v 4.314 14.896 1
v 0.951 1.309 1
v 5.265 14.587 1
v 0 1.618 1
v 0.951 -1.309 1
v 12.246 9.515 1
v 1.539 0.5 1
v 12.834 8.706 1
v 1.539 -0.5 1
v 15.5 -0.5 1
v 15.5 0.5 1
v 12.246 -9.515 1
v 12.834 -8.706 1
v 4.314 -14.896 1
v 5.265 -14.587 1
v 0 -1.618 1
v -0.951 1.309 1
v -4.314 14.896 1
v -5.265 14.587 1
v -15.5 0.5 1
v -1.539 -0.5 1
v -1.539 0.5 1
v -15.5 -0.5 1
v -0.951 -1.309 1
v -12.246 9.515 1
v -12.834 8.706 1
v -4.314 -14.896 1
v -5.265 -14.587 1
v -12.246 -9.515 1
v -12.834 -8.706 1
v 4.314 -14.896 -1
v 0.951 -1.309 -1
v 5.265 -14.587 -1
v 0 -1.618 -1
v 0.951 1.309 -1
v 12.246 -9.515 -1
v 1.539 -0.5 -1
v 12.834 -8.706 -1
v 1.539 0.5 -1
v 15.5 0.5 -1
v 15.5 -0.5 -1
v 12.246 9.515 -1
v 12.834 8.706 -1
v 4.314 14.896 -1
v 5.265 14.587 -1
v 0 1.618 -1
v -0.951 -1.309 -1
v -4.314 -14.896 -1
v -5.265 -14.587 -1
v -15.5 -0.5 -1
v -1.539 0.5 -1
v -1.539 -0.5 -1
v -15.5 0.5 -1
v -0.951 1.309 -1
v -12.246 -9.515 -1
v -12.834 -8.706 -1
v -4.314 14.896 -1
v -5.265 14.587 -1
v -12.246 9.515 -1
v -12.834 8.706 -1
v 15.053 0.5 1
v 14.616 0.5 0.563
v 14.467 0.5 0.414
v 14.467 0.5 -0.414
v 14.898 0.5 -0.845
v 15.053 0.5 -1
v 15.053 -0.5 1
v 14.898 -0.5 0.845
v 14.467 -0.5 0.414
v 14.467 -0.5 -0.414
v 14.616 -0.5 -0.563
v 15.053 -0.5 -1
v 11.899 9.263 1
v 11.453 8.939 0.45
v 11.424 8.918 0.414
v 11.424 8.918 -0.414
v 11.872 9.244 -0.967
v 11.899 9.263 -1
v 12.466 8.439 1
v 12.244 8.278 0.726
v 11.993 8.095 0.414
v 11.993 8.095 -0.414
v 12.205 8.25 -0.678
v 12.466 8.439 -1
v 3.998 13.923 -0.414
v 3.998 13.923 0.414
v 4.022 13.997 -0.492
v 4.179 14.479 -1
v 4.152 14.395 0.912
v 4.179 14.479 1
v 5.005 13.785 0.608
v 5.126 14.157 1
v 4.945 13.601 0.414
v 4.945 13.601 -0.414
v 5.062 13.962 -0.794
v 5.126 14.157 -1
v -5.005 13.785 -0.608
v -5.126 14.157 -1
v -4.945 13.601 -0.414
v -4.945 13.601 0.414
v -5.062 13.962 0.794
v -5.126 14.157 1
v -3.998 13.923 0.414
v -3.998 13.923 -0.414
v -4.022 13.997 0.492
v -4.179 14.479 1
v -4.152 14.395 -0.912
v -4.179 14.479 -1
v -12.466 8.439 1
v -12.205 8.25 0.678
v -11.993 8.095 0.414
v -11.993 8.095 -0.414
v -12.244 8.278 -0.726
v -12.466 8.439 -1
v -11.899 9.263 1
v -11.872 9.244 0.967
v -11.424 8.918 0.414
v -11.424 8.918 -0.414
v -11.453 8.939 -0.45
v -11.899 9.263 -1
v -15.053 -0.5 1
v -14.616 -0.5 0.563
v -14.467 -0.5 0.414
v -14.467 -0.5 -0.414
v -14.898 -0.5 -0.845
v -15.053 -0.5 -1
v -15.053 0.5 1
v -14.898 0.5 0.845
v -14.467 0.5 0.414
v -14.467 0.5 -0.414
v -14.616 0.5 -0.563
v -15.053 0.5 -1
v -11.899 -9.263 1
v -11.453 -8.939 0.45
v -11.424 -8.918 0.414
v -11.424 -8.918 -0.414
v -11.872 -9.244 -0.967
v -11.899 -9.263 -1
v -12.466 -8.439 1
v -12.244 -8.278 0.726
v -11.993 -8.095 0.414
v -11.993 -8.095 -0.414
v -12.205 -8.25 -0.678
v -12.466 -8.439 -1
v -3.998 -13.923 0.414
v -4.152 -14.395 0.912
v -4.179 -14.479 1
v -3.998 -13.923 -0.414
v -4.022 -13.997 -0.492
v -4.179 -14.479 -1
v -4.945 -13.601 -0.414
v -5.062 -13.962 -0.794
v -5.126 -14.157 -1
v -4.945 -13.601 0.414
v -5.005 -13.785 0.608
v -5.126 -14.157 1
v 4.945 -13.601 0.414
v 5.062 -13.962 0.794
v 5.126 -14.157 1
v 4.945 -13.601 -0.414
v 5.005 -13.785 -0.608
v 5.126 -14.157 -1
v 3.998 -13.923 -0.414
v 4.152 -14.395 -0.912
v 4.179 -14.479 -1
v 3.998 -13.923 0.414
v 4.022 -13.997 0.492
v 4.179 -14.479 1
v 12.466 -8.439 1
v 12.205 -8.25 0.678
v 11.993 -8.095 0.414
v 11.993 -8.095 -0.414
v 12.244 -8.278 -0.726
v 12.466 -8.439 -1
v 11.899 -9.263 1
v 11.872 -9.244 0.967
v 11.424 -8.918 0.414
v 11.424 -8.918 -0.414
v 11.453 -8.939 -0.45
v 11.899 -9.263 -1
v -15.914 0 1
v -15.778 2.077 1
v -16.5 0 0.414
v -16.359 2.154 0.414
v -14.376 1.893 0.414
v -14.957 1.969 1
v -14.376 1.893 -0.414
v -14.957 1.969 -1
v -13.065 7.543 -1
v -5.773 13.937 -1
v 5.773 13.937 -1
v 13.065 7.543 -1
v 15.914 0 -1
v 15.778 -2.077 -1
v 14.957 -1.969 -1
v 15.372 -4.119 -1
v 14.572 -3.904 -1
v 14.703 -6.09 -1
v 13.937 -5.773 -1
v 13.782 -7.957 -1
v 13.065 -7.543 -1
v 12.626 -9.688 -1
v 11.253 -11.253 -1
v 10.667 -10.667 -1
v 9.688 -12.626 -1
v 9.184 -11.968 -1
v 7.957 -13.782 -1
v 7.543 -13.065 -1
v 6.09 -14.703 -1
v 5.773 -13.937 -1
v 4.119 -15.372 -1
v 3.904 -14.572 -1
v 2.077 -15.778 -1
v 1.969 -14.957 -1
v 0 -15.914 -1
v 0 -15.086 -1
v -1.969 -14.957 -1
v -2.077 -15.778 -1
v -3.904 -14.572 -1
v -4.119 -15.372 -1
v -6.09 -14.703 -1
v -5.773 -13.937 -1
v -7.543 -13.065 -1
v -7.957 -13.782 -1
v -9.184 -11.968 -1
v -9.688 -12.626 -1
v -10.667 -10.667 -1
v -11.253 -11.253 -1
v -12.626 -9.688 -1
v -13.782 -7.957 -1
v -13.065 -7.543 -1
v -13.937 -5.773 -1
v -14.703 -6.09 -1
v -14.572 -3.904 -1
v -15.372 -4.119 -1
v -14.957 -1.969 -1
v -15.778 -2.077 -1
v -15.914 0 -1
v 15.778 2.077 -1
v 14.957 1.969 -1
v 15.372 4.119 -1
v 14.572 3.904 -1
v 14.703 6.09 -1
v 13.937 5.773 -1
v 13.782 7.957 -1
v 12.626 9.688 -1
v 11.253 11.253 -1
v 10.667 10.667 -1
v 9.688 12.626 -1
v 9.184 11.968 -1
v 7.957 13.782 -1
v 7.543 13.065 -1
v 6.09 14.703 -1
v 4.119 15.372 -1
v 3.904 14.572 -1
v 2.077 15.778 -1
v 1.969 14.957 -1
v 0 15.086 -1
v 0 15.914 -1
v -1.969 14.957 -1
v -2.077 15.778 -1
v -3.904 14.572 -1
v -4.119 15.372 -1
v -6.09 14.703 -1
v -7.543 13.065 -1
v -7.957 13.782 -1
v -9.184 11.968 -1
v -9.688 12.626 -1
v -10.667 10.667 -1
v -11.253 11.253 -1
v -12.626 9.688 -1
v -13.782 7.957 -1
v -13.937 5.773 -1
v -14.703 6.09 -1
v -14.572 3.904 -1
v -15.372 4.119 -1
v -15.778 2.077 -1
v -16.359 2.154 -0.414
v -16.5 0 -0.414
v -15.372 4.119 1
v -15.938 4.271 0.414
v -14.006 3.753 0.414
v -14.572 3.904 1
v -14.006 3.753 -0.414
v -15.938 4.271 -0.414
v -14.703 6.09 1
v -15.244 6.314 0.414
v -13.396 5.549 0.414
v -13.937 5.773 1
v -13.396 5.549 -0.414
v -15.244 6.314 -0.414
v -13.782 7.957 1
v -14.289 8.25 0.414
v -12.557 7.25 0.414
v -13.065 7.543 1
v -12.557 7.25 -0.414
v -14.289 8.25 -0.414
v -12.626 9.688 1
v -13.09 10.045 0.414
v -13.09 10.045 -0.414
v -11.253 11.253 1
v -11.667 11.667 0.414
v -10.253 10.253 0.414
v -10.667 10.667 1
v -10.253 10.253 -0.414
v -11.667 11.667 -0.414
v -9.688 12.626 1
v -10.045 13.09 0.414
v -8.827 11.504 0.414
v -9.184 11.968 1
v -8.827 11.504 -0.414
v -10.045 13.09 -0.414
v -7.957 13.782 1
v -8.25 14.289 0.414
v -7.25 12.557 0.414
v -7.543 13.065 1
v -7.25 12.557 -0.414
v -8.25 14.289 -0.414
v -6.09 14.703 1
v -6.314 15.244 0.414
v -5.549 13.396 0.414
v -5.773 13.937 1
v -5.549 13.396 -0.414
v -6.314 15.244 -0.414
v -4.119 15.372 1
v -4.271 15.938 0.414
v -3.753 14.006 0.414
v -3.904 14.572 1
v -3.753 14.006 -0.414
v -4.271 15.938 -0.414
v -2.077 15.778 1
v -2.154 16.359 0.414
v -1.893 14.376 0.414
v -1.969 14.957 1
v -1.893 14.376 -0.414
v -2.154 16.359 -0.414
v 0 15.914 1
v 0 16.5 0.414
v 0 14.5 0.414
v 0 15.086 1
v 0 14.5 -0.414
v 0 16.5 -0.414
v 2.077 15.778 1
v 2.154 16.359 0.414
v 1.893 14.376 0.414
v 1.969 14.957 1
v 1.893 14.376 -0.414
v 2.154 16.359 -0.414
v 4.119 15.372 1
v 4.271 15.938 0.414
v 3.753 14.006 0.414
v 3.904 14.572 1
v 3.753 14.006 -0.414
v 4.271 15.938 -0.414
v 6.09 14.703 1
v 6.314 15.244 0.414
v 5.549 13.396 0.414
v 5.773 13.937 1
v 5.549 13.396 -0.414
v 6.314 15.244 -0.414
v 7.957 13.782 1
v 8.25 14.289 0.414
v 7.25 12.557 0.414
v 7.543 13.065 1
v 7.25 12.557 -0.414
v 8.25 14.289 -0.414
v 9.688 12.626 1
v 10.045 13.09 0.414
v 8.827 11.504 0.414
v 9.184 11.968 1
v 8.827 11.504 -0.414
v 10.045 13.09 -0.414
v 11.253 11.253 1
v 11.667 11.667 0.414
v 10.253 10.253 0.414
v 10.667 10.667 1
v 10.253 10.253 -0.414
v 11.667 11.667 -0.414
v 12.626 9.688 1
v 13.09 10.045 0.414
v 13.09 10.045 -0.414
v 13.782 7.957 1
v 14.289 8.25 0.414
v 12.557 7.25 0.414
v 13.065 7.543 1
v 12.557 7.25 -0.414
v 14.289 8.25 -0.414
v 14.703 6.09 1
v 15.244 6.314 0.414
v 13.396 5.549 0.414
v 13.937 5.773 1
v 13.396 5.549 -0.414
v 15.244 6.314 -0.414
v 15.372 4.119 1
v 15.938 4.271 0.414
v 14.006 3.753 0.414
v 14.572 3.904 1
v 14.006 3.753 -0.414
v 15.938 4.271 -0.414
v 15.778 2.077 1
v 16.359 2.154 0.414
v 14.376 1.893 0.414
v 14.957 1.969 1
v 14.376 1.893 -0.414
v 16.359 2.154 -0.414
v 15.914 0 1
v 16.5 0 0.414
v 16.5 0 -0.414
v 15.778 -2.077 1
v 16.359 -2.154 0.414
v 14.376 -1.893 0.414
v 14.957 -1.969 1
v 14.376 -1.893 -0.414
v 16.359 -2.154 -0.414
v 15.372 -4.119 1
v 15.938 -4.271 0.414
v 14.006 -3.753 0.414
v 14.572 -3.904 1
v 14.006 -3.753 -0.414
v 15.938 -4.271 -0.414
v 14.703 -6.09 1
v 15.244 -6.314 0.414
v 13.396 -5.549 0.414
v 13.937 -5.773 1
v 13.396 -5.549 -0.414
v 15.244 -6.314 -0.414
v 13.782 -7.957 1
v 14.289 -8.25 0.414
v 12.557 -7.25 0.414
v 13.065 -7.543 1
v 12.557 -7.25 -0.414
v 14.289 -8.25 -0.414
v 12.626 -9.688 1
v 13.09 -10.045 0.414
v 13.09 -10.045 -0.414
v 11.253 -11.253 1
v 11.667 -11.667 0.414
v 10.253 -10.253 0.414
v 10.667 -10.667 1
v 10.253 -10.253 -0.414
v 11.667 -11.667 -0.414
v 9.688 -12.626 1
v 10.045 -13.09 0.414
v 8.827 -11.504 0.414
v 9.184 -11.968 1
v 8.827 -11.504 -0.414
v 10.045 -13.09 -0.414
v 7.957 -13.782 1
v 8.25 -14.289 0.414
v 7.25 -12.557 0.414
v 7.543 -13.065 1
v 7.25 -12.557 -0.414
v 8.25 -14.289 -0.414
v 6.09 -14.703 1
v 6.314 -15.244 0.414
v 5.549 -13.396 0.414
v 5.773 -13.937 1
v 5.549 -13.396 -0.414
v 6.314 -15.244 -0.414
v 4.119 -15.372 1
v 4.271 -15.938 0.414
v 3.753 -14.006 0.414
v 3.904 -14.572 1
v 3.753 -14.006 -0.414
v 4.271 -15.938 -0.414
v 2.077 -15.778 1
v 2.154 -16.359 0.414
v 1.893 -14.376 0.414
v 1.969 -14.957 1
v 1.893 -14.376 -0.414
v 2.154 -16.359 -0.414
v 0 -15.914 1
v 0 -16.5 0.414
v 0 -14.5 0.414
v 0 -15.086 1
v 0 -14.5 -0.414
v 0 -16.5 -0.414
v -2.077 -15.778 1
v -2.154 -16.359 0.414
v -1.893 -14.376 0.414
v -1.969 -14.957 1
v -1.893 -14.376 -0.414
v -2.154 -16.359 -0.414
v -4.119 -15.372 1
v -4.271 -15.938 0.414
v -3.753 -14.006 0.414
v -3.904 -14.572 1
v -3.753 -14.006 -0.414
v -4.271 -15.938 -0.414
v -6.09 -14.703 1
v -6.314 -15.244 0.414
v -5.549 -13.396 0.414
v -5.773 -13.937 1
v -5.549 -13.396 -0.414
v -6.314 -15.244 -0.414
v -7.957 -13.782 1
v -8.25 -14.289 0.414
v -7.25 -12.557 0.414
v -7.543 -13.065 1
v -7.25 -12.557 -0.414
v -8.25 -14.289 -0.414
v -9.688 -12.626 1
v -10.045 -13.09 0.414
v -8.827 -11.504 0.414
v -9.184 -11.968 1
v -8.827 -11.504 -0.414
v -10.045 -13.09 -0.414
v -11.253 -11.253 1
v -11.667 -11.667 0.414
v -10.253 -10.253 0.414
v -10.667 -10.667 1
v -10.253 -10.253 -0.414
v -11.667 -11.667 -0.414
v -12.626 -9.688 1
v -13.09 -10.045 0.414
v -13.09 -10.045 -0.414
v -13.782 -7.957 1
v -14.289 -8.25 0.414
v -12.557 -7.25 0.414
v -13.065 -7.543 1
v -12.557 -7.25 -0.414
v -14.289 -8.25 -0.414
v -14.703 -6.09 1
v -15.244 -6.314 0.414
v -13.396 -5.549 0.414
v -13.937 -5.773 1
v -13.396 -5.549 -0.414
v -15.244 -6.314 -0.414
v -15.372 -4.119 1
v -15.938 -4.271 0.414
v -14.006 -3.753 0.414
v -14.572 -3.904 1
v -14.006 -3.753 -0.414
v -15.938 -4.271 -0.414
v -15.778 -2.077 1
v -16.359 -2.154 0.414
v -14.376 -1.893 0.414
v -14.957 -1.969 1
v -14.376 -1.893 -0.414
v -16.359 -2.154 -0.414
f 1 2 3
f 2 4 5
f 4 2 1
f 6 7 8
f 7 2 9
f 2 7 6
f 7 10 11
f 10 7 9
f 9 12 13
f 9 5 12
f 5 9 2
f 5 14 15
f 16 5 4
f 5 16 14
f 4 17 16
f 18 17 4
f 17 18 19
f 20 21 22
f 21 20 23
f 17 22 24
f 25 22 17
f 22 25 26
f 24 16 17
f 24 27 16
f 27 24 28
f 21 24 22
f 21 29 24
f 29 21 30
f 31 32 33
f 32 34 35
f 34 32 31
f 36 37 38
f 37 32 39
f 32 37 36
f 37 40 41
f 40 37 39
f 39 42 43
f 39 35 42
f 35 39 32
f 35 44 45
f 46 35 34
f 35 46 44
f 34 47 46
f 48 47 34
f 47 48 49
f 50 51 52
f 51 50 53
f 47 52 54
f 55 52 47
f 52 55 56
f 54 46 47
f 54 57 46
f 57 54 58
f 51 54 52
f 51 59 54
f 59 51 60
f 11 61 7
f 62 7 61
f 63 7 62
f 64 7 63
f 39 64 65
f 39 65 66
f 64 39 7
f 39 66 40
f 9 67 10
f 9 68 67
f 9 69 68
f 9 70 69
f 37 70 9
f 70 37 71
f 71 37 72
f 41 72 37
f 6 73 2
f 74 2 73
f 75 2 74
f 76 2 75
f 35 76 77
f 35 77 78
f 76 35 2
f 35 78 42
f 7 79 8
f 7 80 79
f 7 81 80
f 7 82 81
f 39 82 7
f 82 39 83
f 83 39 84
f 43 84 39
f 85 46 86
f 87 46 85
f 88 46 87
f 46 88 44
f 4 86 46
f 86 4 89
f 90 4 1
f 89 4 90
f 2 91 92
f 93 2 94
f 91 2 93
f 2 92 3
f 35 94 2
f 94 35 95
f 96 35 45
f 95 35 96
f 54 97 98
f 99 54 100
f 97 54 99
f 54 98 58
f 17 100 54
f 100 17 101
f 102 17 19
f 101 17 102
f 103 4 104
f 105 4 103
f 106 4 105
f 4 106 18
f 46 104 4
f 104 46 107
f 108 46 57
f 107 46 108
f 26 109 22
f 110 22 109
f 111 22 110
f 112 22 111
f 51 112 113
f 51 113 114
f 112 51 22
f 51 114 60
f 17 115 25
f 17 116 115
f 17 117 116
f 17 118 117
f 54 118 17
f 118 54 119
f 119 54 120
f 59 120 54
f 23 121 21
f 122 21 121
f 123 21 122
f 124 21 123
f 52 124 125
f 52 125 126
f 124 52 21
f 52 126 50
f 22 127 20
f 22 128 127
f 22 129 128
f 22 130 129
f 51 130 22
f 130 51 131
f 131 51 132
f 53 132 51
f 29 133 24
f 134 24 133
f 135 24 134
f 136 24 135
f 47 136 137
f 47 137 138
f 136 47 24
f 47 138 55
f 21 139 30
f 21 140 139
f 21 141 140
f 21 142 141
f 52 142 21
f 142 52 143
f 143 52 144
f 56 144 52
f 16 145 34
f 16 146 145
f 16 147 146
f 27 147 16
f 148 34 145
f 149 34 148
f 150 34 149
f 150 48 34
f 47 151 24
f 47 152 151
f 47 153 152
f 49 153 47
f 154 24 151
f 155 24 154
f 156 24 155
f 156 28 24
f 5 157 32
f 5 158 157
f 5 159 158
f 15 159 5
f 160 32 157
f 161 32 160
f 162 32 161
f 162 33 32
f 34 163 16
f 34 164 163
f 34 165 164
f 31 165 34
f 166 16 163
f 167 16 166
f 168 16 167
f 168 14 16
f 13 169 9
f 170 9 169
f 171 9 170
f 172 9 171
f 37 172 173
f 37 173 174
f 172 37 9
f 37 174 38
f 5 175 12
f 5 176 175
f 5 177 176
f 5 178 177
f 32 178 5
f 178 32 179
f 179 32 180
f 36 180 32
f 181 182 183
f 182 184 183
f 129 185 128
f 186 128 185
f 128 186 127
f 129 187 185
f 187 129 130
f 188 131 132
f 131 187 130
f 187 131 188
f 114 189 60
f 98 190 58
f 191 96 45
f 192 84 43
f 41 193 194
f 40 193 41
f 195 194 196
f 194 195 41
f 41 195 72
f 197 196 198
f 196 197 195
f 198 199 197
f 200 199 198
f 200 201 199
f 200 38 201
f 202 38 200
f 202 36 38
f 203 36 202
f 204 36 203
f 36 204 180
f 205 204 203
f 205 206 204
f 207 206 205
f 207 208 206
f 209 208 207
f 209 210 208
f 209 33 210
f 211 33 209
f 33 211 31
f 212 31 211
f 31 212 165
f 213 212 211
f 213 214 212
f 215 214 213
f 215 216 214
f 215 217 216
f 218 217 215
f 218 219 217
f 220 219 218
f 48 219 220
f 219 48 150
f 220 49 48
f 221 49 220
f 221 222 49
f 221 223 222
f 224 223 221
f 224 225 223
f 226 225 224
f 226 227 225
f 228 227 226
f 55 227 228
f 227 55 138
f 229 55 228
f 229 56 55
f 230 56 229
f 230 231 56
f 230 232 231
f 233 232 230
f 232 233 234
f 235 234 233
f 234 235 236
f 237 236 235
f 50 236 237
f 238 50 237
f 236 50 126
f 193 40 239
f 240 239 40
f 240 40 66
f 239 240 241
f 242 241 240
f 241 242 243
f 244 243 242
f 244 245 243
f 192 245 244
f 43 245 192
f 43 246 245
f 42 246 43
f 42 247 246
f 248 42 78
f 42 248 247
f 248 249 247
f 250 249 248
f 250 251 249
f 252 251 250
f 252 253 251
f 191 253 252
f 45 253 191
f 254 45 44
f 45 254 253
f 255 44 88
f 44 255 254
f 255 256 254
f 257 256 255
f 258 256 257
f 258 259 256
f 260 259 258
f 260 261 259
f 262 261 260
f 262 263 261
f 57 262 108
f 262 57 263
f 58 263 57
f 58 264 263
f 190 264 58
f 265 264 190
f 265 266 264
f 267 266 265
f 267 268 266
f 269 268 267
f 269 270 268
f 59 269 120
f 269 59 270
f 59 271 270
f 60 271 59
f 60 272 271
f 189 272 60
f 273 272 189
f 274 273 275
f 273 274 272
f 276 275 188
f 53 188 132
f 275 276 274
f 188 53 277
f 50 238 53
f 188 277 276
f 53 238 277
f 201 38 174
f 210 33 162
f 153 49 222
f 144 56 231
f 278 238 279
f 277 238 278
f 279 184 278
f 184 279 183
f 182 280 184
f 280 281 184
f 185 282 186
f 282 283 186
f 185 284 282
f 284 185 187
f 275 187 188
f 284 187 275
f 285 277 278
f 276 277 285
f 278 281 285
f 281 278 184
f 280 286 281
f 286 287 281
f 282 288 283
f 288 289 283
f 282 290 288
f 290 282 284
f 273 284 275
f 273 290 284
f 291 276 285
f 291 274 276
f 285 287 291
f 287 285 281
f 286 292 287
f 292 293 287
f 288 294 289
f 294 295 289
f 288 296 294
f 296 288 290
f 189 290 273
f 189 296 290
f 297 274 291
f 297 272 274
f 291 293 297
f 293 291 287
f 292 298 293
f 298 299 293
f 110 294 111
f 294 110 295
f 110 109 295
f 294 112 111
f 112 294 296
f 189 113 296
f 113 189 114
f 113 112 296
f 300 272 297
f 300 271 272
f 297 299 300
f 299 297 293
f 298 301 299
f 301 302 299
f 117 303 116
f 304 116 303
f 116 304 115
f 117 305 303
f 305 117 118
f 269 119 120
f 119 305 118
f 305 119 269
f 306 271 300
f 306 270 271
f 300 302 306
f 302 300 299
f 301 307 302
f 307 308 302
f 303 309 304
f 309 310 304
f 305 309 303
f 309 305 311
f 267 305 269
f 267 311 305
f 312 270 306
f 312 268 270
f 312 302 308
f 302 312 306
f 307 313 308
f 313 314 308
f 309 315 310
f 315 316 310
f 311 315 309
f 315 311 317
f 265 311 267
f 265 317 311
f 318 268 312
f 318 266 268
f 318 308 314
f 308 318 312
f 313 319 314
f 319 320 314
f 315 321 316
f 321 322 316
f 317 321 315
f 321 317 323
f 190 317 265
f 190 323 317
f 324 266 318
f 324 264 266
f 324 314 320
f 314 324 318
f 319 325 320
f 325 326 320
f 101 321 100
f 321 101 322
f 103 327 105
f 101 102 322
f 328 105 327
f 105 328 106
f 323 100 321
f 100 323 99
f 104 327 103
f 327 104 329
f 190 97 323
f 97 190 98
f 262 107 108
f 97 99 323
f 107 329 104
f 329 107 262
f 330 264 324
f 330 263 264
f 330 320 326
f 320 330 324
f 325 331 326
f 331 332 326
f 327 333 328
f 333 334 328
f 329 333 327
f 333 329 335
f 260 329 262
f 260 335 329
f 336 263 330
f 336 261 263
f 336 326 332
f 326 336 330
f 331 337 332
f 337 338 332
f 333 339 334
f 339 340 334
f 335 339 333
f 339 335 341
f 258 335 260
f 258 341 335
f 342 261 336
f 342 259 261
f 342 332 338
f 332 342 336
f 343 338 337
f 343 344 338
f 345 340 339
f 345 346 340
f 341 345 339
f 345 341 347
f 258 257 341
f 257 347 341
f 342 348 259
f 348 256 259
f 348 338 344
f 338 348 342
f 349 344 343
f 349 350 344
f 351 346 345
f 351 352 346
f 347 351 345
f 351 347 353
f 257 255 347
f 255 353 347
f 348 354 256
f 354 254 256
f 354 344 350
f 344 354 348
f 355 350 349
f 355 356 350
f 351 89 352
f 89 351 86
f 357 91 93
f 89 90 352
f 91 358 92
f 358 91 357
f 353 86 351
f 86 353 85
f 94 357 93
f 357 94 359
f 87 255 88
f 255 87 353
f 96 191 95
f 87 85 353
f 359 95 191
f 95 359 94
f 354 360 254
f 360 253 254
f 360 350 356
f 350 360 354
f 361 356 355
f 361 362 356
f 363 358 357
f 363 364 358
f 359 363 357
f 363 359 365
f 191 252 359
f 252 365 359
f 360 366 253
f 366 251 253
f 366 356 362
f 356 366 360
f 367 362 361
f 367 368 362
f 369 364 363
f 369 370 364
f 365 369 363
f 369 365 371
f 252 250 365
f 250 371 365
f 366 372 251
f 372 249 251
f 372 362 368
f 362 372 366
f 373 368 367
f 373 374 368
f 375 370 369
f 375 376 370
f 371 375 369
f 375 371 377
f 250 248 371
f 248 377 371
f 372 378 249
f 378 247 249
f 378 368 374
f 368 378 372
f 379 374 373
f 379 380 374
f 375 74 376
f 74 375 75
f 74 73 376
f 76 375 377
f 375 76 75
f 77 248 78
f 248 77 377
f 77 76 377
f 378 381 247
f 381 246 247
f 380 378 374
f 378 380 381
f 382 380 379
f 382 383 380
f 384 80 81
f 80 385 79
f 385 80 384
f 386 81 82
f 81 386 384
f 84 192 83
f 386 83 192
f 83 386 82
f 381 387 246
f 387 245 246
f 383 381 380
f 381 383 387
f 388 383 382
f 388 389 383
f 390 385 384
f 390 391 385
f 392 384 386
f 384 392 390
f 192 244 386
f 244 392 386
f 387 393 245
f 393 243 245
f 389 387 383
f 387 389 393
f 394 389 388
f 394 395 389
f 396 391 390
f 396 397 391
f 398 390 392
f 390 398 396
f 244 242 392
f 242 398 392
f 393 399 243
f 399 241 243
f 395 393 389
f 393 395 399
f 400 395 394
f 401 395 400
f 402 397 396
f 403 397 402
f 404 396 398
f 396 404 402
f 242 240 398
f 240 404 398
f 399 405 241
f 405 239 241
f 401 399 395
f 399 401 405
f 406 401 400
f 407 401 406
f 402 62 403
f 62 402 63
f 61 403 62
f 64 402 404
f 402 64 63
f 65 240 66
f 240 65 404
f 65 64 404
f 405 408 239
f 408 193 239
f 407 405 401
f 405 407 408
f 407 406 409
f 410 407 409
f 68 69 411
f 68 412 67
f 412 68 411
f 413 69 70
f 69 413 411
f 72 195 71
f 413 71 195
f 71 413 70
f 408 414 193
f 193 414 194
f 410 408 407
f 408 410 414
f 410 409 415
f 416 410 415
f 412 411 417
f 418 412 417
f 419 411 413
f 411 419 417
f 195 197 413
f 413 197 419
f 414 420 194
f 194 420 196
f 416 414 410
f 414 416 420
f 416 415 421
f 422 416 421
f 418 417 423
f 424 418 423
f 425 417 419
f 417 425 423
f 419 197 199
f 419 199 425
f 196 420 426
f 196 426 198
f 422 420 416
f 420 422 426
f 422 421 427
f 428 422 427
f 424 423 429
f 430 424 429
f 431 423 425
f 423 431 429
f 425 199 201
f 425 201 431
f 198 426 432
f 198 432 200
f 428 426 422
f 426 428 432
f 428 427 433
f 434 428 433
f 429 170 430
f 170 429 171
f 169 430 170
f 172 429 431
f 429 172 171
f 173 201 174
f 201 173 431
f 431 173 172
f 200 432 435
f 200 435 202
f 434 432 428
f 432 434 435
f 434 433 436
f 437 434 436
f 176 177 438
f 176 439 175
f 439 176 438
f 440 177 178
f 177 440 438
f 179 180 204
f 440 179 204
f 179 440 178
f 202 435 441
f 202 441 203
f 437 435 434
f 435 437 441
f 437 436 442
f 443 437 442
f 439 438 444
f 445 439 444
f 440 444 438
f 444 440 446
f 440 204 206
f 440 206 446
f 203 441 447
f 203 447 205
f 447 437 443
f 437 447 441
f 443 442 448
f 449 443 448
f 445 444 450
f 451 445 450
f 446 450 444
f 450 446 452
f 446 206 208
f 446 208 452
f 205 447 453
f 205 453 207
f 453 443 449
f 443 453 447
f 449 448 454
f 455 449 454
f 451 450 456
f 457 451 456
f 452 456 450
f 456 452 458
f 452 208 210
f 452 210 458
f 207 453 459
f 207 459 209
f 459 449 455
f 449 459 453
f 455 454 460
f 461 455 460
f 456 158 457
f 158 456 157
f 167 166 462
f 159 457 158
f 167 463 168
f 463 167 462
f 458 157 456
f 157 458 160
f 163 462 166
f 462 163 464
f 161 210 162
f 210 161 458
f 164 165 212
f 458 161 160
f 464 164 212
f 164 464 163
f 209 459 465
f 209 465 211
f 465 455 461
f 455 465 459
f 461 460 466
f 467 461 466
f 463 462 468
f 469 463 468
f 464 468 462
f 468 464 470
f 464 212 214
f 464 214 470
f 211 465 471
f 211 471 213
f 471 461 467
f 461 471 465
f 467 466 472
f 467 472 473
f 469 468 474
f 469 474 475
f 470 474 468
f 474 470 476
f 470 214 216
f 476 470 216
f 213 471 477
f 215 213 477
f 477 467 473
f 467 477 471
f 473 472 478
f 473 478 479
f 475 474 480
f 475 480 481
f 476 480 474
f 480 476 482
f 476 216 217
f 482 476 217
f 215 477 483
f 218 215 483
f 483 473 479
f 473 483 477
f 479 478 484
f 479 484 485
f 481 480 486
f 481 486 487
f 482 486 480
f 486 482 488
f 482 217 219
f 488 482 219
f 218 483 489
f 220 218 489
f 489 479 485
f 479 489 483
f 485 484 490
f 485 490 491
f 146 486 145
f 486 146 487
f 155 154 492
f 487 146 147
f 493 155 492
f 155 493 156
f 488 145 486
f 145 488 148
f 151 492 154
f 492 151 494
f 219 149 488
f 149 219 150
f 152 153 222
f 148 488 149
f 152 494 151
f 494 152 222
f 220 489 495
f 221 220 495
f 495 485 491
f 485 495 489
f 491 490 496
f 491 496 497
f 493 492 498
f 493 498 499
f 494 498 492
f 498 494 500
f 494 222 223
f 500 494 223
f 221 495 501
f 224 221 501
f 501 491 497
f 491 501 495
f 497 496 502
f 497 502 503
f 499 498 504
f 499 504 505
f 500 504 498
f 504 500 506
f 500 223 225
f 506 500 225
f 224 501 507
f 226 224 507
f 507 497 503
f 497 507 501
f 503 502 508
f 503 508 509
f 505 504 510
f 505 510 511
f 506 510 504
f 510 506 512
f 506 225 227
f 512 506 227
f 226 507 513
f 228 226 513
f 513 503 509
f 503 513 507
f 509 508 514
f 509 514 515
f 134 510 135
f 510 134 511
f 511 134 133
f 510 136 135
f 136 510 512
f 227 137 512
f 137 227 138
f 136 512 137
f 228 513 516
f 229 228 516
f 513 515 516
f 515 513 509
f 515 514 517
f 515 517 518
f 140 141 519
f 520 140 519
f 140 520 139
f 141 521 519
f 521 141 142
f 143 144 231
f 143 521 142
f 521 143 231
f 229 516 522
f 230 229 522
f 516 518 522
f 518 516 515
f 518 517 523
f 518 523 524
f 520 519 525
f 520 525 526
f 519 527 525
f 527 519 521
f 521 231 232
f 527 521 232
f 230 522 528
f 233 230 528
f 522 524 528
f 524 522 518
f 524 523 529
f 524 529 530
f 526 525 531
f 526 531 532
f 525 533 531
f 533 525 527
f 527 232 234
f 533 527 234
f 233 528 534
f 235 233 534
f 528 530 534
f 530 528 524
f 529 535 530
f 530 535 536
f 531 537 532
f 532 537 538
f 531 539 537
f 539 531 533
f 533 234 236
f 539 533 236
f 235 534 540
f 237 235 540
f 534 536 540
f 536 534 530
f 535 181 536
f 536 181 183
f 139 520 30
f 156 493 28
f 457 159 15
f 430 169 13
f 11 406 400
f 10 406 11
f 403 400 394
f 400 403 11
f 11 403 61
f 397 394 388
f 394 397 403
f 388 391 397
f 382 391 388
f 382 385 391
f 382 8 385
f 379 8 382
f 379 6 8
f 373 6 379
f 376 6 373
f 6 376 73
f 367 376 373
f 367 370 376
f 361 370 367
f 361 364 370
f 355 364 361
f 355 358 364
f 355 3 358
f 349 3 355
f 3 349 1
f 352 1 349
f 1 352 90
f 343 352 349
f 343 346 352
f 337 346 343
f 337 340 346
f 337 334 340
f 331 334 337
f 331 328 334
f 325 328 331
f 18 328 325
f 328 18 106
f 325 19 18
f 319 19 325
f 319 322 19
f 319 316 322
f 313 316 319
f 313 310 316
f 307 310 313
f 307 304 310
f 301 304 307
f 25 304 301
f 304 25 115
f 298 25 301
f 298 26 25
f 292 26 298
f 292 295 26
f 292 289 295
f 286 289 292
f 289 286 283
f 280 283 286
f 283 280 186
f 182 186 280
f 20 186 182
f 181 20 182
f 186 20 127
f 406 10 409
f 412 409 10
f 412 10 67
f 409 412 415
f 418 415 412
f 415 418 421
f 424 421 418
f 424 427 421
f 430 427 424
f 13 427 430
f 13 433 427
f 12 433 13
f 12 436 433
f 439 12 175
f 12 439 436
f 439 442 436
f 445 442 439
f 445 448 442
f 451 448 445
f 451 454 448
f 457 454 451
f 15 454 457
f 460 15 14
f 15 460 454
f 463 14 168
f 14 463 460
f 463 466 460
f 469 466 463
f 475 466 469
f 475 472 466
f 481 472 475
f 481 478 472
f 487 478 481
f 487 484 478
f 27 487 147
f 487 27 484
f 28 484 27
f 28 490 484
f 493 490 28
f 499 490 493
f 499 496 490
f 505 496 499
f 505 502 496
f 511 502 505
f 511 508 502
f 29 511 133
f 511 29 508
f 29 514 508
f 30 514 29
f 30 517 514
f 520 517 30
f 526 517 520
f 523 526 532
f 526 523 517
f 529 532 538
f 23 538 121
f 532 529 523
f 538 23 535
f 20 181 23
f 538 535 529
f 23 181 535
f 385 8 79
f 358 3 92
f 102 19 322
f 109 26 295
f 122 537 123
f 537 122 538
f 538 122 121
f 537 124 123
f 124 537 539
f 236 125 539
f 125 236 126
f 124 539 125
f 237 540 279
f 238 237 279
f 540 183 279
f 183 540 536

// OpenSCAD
// file: high-wheel.scad
// Number and angle of cylinders
CONFIGURATION = 1; // [1:Man, 2:Woman]

// Distance between the stepper motor screws in millimeters
MOTOR_SIZE = 31; // [20:0.1:50]

// Diameter in millimeters inside the motor screw holes
MOUNTING_TAB_SIZE = 6.15; // [4.5:0.01:7.5]

// Tolerance between moving parts
TOLERANCE = 0.2; // [0.1:0.05:0.5]

$fn     = 24 + 0;                // Curve resolution
PIN     = 2 + 0;                 // Pin radius
WALL    = 2 + 0;                 // Wall thickness
MOUNT   = MOUNTING_TAB_SIZE / 2; // Motor mount tab radius
SQRT2   = sqrt(2);               // Square root of 2
TOLHALF = TOLERANCE / 2;         // Half of the part tolerance
CRANK   = MOTOR_SIZE / 6;        // Peddle crank length
ROD     = MOTOR_SIZE / 2;        // Connecting rod length
PIN_HEIGHT = 4 + 0;
OCTO_R  = sqrt( 4 - 2 * SQRT2 ); // Found in octo-math.md




/***************************************
 *  Layout all the parts for printing  *
 ***************************************
 */


/***************************************************
 *  Modules for building each part of the bicycle  *
 ***************************************************
 */

module mount() {
	d = MOUNT/2;

	translate([0, 0, -1])
		difference() {
			cylinder(r = MOUNT, h = 1); // outside diameter
			translate([0, 0, -1])
				cylinder(r = MOUNT-0.6, h = 3); // inside diameter
		}
}

module pin() {
	// Pin body
	cylinder(r = PIN, h = PIN_HEIGHT);

	// Upper cone
	translate([0, 0, PIN_HEIGHT+0.5])
		cylinder(r1 = PIN + 0.5, r2 = PIN, h = 0.5);

	// Lower cone
	translate([0, 0, PIN_HEIGHT])
		cylinder(r1 = PIN, r2 = PIN + 0.5, h = 0.5);
}

module spoke() {
	translate([0, -0.5, -1])
		cube([MOTOR_SIZE/2, 1, 2]);
}

module wheel(radius, spokes) {
	a = 360/spokes; // Angle for each spoke

	union() {
		rotate_extrude(angle=360, convexity=4, $fn=$fn*2)
			translate([radius, 0, 0])
				rotate(22.5, [0,0,1])
					circle(d=2*OCTO_R, $fn=8);

		for (i = [0:spokes-1])
			rotate([0, 0, i*a])
				spoke();
	}
}

module frame() {
}
// main file
include <high-wheel.scad>;

module combined(explode = 0) {
	wheel();
}

module exploded(explode) {
	translate([0, 0, MOTOR_SIZE])
		rotate([90, 0, 0])
			translate([0, 0, -explode*3])
				combined(explode);
}

/*
crank();
rod();

exploded(5);

rotate([90, 0, 0])
	combined();
*/
wheel(MOTOR_SIZE/2, 10);
